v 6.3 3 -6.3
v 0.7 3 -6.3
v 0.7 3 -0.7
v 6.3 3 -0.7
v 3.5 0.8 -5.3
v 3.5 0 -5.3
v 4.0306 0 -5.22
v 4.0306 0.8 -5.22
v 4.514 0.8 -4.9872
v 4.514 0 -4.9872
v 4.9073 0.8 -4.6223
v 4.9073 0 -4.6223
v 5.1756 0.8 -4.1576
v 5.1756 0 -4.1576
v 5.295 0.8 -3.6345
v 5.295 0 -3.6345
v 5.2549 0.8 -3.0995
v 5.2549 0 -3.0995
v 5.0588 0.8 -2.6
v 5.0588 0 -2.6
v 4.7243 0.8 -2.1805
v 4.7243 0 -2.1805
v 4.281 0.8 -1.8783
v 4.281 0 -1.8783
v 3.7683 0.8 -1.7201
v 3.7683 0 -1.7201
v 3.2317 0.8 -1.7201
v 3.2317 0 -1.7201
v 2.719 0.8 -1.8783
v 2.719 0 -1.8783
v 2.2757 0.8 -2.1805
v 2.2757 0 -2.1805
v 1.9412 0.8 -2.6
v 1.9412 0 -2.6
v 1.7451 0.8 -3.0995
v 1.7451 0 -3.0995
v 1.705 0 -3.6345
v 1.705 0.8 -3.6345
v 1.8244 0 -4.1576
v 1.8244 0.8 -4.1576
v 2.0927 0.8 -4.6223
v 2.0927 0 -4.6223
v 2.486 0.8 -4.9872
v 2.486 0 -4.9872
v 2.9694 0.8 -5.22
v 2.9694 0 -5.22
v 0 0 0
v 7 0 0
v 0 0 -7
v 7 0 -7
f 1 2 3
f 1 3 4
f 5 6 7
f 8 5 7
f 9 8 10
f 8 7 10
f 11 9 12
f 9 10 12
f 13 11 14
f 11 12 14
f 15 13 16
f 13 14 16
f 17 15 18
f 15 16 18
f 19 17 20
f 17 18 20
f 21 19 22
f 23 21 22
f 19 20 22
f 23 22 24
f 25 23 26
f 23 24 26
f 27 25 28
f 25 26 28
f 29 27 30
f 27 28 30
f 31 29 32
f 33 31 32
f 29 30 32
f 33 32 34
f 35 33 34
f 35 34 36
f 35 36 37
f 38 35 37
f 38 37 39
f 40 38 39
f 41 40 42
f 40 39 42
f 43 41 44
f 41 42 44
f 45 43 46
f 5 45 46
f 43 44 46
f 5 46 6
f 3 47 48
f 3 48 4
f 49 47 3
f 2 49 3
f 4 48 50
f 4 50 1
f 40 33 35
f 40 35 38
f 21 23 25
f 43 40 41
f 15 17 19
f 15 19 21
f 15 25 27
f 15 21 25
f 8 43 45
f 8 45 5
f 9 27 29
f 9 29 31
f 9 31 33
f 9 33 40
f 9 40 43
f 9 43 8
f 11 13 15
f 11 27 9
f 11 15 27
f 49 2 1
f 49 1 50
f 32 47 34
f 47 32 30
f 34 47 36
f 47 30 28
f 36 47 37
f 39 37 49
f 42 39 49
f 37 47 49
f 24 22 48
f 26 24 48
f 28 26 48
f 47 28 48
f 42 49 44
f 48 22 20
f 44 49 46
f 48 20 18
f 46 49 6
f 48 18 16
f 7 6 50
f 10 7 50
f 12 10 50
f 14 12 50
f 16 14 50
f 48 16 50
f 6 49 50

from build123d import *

# Parameters (mm, degrees)
SKETCH1_W           = 7
SKETCH1_H           = 7
BOSS_EXTRUDE1_DEPTH = 3
CUT_EXTRUDE1_DEPTH  = 7
CUT_EXTRUDE2_DEPTH  = 11
SKETCH4_R           = 1.8
CUT_EXTRUDE3_DEPTH  = 0.8


with BuildPart() as part:
    # Sketch1 → Boss-Extrude1 (new body)
    with BuildSketch(Plane(origin=(0, 0, 0), x_dir=(1, 0, 0), z_dir=(0, 1, 0))):
        with Locations((3.5, 3.5)):
            Rectangle(SKETCH1_W, SKETCH1_H)
    extrude(amount=BOSS_EXTRUDE1_DEPTH)

    # Sketch2 → Cut-Extrude1 (cut)
    with BuildSketch(Plane.XY):
        Polygon((0, 0), (0.7, 3), (0, 3), align=None)
        Polygon((7, 0), (6.3, 3), (7, 3), align=None)
    extrude(amount=-CUT_EXTRUDE1_DEPTH, mode=Mode.SUBTRACT)

    # Sketch3 → Cut-Extrude2 (cut)
    with BuildSketch(Plane(origin=(0, 0, 0), x_dir=(0, 0, -1), z_dir=(1, 0, 0))):
        Polygon((0, 0), (0.7, 3), (0, 3), align=None)
        Polygon((7, 3), (6.3, 3), (7, 0), align=None)
    extrude(amount=CUT_EXTRUDE2_DEPTH, mode=Mode.SUBTRACT)

    # Sketch4 → Cut-Extrude3 (cut)
    with BuildSketch(Plane.XZ):
        with Locations(Location((3.5, -3.5, 0), (0, 0, 270))):
            Circle(SKETCH4_R)
    extrude(amount=-CUT_EXTRUDE3_DEPTH, mode=Mode.SUBTRACT)


solid = part.part
